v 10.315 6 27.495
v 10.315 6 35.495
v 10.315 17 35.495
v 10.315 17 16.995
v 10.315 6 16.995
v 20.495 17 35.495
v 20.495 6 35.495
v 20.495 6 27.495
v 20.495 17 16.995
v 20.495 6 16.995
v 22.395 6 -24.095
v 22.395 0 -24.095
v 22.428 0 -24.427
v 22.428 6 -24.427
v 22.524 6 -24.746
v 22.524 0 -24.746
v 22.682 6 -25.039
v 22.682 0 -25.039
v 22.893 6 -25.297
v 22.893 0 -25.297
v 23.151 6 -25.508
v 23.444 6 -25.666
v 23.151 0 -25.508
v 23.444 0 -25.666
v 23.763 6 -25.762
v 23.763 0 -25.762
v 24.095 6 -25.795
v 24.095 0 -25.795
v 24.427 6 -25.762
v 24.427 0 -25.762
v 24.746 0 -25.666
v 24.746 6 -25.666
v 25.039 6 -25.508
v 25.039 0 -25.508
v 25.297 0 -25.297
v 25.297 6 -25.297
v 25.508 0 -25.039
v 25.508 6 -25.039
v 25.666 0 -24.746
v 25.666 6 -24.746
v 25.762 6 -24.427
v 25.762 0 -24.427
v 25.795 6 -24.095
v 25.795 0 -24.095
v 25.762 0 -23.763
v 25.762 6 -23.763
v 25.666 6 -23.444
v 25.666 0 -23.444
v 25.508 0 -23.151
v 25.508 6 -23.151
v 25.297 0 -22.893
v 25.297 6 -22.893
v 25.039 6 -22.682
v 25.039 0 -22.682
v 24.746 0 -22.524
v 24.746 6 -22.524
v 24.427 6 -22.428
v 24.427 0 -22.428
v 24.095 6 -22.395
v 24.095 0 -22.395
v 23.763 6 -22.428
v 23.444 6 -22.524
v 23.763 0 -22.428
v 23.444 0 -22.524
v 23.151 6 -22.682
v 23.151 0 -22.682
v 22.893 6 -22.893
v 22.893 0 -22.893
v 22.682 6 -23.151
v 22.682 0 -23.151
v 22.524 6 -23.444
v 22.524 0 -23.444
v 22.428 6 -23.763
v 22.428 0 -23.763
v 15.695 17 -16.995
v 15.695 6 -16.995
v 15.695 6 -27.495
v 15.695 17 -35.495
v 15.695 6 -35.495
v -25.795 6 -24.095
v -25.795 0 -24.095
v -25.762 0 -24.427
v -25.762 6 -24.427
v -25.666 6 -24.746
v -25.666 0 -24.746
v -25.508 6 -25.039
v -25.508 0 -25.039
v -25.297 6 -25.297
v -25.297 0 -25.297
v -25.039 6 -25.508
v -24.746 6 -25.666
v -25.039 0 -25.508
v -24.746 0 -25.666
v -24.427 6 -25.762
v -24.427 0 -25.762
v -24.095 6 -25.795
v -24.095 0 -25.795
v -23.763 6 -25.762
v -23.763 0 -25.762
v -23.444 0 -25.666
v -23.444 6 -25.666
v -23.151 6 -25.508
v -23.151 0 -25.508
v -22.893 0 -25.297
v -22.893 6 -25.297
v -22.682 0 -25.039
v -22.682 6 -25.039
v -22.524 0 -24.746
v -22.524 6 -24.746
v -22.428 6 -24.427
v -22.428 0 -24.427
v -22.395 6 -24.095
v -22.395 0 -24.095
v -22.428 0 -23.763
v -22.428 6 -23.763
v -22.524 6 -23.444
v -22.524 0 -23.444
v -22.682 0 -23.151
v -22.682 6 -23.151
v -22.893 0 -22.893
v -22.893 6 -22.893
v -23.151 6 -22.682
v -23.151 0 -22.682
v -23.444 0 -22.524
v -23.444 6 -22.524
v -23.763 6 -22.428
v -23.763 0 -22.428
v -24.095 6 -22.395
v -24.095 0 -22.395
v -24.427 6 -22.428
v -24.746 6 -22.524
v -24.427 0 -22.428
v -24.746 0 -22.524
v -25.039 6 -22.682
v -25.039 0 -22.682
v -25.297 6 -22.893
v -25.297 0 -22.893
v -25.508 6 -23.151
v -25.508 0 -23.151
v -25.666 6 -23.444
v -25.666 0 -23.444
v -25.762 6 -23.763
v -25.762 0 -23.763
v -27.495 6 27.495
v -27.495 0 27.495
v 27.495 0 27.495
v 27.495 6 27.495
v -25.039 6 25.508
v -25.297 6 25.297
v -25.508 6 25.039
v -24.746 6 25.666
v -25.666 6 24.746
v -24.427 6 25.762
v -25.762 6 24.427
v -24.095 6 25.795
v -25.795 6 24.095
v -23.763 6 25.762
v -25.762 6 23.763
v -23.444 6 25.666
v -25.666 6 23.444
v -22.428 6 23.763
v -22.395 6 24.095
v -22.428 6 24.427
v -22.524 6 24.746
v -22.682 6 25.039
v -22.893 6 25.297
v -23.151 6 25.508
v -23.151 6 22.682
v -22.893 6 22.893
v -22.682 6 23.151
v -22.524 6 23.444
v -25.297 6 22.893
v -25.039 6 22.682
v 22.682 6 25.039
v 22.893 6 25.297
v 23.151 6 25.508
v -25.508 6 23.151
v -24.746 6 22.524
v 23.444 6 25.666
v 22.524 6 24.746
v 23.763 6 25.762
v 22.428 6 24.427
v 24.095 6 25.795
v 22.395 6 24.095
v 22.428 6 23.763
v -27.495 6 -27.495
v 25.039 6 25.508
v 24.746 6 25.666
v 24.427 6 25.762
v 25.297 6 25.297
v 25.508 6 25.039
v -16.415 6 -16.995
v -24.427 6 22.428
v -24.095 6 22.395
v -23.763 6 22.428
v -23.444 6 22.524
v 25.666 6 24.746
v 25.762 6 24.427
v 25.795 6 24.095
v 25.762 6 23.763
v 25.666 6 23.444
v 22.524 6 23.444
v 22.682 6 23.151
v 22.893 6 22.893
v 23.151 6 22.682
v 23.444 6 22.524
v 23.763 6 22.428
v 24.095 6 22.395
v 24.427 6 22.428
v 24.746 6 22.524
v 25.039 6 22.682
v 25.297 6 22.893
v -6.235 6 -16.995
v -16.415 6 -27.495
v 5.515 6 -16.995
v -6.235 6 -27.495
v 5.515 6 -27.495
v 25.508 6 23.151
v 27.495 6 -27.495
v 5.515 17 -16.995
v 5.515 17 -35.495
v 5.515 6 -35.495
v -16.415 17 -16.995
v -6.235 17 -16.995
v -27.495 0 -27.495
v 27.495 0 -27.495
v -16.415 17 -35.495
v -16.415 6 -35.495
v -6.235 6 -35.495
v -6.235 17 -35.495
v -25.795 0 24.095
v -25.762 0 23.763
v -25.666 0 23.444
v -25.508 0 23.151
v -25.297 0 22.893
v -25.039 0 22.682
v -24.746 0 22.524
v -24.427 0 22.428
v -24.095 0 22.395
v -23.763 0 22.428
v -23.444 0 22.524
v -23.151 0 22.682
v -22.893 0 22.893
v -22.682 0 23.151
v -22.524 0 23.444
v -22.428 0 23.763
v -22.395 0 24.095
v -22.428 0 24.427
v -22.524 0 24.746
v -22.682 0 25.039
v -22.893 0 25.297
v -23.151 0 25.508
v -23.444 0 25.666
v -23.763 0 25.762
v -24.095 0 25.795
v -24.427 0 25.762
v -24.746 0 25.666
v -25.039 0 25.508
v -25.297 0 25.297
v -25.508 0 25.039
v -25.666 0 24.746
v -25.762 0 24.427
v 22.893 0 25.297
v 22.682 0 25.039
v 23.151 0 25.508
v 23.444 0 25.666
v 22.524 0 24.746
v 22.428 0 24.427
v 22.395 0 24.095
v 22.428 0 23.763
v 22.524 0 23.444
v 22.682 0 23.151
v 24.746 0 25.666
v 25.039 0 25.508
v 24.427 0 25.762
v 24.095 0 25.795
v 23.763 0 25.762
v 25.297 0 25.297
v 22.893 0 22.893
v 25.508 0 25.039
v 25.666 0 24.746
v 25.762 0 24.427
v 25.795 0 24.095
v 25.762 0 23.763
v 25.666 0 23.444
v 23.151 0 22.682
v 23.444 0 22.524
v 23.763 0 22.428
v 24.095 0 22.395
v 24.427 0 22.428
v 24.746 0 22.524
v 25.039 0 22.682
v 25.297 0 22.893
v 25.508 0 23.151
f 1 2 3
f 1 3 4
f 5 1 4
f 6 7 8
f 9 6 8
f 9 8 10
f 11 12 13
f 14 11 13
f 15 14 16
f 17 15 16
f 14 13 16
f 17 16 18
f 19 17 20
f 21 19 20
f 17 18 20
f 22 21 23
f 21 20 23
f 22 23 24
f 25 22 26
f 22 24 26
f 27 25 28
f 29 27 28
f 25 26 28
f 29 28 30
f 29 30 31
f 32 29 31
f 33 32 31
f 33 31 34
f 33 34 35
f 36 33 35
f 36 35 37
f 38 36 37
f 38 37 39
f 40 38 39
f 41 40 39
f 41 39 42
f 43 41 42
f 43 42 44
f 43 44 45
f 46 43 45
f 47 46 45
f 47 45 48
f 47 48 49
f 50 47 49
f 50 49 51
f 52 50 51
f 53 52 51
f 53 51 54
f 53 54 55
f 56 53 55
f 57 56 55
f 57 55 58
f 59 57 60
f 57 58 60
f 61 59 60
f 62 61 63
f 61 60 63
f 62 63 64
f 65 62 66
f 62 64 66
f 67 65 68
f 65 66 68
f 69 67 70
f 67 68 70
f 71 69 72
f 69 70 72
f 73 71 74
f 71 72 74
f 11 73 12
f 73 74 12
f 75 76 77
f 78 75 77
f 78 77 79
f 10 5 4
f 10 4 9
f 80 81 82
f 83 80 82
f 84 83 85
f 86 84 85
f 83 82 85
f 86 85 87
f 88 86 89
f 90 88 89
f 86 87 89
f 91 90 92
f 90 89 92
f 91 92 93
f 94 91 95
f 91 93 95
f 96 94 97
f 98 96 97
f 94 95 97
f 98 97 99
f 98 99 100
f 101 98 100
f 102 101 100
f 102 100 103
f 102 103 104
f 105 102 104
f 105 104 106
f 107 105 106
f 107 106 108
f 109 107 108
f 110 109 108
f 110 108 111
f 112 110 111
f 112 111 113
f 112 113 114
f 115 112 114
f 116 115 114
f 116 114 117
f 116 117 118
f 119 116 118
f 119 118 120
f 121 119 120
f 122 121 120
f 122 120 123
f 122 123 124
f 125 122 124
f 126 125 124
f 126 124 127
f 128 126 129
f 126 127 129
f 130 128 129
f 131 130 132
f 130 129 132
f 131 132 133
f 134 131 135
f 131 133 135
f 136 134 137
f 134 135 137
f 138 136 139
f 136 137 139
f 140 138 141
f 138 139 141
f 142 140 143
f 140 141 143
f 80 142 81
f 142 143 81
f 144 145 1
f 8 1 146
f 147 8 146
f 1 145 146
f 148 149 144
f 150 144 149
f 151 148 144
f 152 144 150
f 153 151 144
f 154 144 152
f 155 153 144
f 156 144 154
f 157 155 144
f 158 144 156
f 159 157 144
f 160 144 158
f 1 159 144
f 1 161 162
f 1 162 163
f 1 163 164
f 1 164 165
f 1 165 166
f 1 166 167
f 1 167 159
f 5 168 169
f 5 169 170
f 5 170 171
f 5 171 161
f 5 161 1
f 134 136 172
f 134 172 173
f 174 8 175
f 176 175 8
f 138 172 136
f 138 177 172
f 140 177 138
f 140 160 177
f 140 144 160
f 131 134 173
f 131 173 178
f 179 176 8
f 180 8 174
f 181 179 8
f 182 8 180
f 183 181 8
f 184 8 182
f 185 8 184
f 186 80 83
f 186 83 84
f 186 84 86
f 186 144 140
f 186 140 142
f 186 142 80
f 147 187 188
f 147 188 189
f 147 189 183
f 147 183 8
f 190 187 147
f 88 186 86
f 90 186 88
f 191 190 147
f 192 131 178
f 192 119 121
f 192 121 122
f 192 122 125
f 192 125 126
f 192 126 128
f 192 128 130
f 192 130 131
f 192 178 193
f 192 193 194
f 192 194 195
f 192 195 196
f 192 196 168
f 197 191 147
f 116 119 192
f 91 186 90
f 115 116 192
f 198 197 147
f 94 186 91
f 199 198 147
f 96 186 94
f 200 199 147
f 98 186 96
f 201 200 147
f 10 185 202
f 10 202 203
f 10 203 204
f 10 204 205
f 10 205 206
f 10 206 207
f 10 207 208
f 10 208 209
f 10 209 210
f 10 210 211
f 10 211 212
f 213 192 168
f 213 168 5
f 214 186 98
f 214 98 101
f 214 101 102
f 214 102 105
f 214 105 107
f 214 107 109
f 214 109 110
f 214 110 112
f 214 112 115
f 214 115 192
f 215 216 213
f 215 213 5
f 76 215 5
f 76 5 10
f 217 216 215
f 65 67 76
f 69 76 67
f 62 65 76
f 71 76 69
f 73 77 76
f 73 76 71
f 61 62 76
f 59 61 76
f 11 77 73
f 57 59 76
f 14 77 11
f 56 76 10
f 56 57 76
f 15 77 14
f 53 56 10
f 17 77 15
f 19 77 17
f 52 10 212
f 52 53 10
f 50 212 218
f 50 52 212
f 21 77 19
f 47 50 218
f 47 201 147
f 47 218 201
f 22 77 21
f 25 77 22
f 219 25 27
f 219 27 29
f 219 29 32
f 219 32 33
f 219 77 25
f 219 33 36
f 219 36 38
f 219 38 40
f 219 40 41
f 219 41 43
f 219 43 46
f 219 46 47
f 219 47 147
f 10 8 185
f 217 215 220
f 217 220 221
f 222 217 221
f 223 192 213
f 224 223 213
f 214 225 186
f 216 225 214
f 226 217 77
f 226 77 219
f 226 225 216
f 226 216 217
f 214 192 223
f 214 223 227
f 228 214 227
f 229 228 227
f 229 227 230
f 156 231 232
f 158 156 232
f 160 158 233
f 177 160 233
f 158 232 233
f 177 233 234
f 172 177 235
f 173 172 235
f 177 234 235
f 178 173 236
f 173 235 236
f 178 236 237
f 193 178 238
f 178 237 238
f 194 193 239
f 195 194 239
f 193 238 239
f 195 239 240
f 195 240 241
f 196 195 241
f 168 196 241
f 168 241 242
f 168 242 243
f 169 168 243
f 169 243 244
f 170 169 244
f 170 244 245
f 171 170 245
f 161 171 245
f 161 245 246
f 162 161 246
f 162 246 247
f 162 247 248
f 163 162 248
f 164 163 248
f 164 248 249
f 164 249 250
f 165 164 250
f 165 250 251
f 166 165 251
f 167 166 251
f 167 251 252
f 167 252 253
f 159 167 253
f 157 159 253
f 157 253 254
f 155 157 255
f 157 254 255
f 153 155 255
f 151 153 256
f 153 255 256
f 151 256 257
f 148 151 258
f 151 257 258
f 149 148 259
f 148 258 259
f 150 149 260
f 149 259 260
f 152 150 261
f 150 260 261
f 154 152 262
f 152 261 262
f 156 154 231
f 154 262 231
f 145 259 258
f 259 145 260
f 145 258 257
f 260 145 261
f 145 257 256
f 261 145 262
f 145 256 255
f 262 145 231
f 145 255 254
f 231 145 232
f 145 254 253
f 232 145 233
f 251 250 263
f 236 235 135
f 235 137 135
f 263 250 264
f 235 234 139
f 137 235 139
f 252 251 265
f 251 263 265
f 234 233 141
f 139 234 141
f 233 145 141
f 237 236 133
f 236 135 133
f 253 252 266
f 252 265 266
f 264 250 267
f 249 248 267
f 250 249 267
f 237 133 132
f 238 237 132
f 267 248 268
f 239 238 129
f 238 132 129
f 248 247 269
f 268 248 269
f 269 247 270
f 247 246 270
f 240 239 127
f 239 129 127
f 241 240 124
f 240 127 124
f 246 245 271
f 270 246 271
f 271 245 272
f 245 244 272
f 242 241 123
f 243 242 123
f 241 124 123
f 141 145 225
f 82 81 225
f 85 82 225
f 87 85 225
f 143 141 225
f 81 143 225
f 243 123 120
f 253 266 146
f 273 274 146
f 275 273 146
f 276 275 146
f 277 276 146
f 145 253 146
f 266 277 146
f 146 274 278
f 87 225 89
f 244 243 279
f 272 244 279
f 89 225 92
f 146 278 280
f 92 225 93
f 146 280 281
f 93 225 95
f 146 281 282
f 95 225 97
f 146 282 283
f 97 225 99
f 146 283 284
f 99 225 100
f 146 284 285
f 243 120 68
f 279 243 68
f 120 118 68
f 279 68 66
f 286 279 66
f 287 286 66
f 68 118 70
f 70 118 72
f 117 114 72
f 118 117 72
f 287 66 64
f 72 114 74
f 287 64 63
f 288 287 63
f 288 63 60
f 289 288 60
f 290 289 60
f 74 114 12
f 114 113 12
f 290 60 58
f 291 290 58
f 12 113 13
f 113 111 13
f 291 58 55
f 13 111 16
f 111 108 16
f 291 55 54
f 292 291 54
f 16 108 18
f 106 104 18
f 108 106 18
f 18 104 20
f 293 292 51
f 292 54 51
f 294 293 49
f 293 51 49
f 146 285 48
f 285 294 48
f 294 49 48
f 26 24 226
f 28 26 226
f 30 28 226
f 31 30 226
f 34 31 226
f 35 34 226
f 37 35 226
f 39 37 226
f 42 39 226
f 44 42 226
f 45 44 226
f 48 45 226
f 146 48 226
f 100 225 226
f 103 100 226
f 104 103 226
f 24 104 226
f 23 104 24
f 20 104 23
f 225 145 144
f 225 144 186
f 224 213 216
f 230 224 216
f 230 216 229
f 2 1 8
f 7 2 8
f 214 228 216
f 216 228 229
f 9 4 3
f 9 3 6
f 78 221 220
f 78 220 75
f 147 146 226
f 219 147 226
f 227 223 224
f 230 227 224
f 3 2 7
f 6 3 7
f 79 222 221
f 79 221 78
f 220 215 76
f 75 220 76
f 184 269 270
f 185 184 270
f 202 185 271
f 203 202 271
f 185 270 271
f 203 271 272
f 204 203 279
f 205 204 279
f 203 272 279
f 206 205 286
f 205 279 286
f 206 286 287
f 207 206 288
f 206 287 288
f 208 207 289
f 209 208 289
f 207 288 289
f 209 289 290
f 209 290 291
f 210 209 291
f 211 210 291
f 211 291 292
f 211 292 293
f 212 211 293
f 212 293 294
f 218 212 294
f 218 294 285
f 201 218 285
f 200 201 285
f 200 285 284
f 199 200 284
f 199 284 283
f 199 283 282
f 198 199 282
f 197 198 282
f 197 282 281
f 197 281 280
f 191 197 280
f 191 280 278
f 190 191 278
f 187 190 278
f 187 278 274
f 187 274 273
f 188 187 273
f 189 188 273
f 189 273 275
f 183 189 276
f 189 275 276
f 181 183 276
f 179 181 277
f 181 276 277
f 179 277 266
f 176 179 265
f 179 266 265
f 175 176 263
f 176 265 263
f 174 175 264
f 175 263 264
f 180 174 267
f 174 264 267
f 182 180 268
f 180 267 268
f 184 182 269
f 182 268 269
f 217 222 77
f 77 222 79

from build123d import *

# Parameters (mm, degrees)
SKETCH1_W            = 54.99
SKETCH1_H            = 54.99
BOSS_EXTRUDE1_DEPTH  = 6
M3_CLEARANCE_HOLE2_D = 3.4
SKETCH8_W            = 10.18
SKETCH8_H            = 18.5
BOSS_EXTRUDE2_DEPTH  = 11


with BuildPart() as part:
    # Sketch1 → Boss-Extrude1 (new body)
    with BuildSketch(Plane(origin=(0, 0, 0), x_dir=(1, 0, 0), z_dir=(0, 1, 0))):
        Rectangle(SKETCH1_W, SKETCH1_H)
    extrude(amount=BOSS_EXTRUDE1_DEPTH)

    # M3 Clearance Hole2 (through all)
    with Locations(Plane(origin=(0, 6, 0), x_dir=(1, 0, 0), z_dir=(0, 1, 0))):
        with Locations((-24.095, 24.095), (24.095, 24.095), (24.095, -24.095), (-24.095, -24.095)):
            Hole(M3_CLEARANCE_HOLE2_D / 2)

    # Sketch8 → Boss-Extrude2 (add)
    with BuildSketch(Plane(origin=(0, 6, 0), x_dir=(1, 0, 0), z_dir=(0, 1, 0))):
        with Locations((-11.325, 26.245)):
            Rectangle(SKETCH8_W, SKETCH8_H)
        with Locations((10.605, 26.245)):
            Rectangle(SKETCH8_W, SKETCH8_H)
        with Locations((15.405, -26.245)):
            Rectangle(SKETCH8_W, SKETCH8_H)
    extrude(amount=BOSS_EXTRUDE2_DEPTH)


solid = part.part
